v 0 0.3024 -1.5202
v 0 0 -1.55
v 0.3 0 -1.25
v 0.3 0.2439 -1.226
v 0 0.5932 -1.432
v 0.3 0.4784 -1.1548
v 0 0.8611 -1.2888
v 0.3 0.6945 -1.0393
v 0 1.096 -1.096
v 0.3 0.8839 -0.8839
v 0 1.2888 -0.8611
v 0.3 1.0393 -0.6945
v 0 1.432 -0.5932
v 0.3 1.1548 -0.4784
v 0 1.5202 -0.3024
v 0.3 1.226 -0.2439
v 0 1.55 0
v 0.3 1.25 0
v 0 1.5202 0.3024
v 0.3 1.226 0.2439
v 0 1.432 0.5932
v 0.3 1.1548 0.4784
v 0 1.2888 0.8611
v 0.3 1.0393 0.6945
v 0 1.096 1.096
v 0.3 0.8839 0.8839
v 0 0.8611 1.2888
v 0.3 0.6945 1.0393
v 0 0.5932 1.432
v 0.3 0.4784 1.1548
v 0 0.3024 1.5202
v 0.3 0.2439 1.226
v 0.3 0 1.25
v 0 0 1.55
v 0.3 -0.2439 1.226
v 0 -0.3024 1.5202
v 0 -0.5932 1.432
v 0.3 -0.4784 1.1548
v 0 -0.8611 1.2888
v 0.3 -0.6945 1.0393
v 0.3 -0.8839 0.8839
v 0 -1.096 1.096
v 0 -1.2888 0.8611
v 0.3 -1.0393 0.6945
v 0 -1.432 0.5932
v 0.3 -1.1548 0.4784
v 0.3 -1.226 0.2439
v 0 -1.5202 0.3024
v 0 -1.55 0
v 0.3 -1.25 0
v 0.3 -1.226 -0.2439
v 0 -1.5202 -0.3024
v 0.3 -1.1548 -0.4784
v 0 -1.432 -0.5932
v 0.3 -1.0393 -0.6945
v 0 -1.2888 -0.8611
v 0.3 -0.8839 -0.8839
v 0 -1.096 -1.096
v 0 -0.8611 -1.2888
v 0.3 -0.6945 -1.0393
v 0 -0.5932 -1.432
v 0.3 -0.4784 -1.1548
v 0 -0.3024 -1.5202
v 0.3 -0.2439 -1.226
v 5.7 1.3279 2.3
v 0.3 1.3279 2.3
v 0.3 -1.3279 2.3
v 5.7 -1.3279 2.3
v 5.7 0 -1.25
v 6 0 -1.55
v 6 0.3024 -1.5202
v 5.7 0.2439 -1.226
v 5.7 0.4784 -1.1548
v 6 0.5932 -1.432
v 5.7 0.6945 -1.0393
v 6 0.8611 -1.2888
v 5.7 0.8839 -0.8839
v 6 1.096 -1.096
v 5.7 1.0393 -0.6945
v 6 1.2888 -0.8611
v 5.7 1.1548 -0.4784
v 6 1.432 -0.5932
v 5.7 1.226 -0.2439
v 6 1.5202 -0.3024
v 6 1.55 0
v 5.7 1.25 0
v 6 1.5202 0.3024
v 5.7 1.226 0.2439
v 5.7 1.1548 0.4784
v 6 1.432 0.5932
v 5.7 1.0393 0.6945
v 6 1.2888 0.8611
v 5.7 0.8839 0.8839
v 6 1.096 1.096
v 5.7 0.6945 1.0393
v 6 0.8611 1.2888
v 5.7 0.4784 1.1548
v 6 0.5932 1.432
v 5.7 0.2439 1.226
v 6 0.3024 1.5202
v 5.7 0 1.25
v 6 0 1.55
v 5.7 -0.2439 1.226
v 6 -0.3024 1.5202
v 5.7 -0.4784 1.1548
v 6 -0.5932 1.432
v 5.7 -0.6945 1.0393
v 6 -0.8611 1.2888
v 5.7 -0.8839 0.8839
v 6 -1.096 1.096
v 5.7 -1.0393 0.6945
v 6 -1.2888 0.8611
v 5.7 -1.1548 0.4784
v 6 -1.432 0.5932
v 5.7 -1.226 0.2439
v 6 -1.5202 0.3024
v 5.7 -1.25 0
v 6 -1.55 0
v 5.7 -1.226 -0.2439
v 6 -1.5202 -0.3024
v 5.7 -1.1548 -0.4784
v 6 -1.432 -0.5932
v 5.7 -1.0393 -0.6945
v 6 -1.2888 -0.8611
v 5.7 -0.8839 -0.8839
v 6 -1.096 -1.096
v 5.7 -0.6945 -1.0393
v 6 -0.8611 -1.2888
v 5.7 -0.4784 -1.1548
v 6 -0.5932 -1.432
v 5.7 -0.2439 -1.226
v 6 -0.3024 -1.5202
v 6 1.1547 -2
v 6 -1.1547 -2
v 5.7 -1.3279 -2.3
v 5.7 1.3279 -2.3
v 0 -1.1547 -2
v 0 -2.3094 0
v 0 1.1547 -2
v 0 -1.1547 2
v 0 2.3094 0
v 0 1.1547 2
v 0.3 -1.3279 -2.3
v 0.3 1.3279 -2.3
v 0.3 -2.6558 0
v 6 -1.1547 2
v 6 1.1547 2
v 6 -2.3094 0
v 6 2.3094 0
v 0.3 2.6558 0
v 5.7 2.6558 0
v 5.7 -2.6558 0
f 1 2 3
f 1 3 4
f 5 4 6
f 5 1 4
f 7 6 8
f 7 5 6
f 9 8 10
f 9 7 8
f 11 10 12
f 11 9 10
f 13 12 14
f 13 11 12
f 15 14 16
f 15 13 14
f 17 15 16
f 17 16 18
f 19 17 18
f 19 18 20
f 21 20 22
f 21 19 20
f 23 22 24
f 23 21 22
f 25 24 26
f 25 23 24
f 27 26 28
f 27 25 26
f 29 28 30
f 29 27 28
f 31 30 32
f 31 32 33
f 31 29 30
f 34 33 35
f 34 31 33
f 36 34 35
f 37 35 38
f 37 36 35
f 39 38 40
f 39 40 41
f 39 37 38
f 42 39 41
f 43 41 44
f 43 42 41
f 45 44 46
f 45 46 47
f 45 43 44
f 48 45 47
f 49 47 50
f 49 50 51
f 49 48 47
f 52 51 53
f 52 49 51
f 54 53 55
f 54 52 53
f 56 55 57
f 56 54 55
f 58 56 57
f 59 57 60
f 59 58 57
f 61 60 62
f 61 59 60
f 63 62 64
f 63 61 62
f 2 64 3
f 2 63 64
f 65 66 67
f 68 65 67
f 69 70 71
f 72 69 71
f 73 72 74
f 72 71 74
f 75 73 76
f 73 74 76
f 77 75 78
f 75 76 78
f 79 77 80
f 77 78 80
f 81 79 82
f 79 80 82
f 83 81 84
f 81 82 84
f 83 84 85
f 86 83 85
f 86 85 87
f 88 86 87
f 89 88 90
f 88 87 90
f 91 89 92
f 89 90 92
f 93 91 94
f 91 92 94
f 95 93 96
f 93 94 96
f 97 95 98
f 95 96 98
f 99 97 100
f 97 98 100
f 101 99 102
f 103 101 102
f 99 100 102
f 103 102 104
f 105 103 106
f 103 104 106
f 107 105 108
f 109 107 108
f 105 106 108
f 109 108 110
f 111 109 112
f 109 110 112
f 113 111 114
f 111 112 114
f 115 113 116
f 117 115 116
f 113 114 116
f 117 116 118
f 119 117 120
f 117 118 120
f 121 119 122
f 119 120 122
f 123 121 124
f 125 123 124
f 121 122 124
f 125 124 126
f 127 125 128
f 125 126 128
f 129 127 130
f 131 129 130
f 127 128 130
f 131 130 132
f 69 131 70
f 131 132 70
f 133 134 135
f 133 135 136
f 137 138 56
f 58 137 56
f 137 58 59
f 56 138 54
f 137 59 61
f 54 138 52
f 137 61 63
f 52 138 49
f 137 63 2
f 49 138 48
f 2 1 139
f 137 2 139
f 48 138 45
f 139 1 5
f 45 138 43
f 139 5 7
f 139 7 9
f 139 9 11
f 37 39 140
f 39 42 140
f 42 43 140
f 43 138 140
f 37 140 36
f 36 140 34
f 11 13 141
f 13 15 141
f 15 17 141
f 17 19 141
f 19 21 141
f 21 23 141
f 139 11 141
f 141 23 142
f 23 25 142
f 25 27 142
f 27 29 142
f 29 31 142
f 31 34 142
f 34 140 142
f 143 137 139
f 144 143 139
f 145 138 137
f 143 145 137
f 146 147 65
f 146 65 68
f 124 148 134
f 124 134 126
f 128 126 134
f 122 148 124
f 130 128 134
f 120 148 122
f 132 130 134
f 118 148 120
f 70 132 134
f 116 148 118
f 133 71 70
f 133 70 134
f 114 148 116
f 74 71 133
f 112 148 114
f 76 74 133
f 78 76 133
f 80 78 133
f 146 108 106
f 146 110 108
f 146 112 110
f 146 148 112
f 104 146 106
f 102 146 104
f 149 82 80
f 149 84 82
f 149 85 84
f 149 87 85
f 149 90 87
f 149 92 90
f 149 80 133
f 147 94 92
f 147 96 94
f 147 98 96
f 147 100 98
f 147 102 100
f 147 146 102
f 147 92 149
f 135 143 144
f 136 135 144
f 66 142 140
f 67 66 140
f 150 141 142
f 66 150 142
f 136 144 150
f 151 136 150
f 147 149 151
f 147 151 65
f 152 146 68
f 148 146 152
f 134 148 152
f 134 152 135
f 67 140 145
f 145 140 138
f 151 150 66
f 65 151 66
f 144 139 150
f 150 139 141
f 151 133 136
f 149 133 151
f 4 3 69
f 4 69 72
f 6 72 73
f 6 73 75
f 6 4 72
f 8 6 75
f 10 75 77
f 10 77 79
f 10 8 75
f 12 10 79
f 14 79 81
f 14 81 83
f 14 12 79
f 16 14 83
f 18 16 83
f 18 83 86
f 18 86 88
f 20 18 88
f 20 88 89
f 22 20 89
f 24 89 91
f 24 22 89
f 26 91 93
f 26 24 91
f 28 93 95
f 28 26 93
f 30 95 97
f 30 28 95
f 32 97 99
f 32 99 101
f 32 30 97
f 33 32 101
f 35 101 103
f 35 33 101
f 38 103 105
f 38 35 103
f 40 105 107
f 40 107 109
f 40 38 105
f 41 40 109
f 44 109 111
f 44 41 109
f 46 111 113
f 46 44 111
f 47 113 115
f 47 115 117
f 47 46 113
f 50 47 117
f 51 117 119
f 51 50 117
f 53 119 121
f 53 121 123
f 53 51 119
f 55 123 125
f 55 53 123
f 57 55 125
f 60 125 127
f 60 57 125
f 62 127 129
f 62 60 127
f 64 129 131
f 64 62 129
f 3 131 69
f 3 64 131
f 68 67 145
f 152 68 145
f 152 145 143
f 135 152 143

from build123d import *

# Parameters (mm, degrees)
SKETCH_1_R      = 1.25
EXTRUDE_1_DEPTH = 6
CHAMFER_1_SIZE  = 0.3


with BuildPart() as part:
    # 草图1 → 凸台-拉伸1 (new body)
    with BuildSketch(Plane.YZ):
        Polygon((2.655811238, 0), (1.327905619, 2.3), (-1.327905619, 2.3), (-2.655811238, 0), (-1.327905619, -2.3), (1.327905619, -2.3), align=None)
        with Locations(Location((0, 0, 0), (0, 0, 270))):
            Circle(SKETCH_1_R, mode=Mode.SUBTRACT)
    extrude(amount=EXTRUDE_1_DEPTH)

    # 倒角1
    chamfer_1_edges = [part.edges().sort_by_distance(p)[0] for p in [
        (6, 0, 2.3),
        (6, -1.991858429, 1.15),
        (0, 0, 1.25),
        (6, 0, 1.25),
        (6, -1.991858429, -1.15),
        (6, 0, -2.3),
        (6, 1.991858429, -1.15),
        (0, 0, -2.3),
        (0, -1.991858429, -1.15),
        (0, -1.991858429, 1.15),
        (0, 0, 2.3),
        (0, 1.991858429, 1.15),
        (0, 1.991858429, -1.15),
        (6, 1.991858429, 1.15),
    ]]
    chamfer(chamfer_1_edges, length=CHAMFER_1_SIZE)


solid = part.part
